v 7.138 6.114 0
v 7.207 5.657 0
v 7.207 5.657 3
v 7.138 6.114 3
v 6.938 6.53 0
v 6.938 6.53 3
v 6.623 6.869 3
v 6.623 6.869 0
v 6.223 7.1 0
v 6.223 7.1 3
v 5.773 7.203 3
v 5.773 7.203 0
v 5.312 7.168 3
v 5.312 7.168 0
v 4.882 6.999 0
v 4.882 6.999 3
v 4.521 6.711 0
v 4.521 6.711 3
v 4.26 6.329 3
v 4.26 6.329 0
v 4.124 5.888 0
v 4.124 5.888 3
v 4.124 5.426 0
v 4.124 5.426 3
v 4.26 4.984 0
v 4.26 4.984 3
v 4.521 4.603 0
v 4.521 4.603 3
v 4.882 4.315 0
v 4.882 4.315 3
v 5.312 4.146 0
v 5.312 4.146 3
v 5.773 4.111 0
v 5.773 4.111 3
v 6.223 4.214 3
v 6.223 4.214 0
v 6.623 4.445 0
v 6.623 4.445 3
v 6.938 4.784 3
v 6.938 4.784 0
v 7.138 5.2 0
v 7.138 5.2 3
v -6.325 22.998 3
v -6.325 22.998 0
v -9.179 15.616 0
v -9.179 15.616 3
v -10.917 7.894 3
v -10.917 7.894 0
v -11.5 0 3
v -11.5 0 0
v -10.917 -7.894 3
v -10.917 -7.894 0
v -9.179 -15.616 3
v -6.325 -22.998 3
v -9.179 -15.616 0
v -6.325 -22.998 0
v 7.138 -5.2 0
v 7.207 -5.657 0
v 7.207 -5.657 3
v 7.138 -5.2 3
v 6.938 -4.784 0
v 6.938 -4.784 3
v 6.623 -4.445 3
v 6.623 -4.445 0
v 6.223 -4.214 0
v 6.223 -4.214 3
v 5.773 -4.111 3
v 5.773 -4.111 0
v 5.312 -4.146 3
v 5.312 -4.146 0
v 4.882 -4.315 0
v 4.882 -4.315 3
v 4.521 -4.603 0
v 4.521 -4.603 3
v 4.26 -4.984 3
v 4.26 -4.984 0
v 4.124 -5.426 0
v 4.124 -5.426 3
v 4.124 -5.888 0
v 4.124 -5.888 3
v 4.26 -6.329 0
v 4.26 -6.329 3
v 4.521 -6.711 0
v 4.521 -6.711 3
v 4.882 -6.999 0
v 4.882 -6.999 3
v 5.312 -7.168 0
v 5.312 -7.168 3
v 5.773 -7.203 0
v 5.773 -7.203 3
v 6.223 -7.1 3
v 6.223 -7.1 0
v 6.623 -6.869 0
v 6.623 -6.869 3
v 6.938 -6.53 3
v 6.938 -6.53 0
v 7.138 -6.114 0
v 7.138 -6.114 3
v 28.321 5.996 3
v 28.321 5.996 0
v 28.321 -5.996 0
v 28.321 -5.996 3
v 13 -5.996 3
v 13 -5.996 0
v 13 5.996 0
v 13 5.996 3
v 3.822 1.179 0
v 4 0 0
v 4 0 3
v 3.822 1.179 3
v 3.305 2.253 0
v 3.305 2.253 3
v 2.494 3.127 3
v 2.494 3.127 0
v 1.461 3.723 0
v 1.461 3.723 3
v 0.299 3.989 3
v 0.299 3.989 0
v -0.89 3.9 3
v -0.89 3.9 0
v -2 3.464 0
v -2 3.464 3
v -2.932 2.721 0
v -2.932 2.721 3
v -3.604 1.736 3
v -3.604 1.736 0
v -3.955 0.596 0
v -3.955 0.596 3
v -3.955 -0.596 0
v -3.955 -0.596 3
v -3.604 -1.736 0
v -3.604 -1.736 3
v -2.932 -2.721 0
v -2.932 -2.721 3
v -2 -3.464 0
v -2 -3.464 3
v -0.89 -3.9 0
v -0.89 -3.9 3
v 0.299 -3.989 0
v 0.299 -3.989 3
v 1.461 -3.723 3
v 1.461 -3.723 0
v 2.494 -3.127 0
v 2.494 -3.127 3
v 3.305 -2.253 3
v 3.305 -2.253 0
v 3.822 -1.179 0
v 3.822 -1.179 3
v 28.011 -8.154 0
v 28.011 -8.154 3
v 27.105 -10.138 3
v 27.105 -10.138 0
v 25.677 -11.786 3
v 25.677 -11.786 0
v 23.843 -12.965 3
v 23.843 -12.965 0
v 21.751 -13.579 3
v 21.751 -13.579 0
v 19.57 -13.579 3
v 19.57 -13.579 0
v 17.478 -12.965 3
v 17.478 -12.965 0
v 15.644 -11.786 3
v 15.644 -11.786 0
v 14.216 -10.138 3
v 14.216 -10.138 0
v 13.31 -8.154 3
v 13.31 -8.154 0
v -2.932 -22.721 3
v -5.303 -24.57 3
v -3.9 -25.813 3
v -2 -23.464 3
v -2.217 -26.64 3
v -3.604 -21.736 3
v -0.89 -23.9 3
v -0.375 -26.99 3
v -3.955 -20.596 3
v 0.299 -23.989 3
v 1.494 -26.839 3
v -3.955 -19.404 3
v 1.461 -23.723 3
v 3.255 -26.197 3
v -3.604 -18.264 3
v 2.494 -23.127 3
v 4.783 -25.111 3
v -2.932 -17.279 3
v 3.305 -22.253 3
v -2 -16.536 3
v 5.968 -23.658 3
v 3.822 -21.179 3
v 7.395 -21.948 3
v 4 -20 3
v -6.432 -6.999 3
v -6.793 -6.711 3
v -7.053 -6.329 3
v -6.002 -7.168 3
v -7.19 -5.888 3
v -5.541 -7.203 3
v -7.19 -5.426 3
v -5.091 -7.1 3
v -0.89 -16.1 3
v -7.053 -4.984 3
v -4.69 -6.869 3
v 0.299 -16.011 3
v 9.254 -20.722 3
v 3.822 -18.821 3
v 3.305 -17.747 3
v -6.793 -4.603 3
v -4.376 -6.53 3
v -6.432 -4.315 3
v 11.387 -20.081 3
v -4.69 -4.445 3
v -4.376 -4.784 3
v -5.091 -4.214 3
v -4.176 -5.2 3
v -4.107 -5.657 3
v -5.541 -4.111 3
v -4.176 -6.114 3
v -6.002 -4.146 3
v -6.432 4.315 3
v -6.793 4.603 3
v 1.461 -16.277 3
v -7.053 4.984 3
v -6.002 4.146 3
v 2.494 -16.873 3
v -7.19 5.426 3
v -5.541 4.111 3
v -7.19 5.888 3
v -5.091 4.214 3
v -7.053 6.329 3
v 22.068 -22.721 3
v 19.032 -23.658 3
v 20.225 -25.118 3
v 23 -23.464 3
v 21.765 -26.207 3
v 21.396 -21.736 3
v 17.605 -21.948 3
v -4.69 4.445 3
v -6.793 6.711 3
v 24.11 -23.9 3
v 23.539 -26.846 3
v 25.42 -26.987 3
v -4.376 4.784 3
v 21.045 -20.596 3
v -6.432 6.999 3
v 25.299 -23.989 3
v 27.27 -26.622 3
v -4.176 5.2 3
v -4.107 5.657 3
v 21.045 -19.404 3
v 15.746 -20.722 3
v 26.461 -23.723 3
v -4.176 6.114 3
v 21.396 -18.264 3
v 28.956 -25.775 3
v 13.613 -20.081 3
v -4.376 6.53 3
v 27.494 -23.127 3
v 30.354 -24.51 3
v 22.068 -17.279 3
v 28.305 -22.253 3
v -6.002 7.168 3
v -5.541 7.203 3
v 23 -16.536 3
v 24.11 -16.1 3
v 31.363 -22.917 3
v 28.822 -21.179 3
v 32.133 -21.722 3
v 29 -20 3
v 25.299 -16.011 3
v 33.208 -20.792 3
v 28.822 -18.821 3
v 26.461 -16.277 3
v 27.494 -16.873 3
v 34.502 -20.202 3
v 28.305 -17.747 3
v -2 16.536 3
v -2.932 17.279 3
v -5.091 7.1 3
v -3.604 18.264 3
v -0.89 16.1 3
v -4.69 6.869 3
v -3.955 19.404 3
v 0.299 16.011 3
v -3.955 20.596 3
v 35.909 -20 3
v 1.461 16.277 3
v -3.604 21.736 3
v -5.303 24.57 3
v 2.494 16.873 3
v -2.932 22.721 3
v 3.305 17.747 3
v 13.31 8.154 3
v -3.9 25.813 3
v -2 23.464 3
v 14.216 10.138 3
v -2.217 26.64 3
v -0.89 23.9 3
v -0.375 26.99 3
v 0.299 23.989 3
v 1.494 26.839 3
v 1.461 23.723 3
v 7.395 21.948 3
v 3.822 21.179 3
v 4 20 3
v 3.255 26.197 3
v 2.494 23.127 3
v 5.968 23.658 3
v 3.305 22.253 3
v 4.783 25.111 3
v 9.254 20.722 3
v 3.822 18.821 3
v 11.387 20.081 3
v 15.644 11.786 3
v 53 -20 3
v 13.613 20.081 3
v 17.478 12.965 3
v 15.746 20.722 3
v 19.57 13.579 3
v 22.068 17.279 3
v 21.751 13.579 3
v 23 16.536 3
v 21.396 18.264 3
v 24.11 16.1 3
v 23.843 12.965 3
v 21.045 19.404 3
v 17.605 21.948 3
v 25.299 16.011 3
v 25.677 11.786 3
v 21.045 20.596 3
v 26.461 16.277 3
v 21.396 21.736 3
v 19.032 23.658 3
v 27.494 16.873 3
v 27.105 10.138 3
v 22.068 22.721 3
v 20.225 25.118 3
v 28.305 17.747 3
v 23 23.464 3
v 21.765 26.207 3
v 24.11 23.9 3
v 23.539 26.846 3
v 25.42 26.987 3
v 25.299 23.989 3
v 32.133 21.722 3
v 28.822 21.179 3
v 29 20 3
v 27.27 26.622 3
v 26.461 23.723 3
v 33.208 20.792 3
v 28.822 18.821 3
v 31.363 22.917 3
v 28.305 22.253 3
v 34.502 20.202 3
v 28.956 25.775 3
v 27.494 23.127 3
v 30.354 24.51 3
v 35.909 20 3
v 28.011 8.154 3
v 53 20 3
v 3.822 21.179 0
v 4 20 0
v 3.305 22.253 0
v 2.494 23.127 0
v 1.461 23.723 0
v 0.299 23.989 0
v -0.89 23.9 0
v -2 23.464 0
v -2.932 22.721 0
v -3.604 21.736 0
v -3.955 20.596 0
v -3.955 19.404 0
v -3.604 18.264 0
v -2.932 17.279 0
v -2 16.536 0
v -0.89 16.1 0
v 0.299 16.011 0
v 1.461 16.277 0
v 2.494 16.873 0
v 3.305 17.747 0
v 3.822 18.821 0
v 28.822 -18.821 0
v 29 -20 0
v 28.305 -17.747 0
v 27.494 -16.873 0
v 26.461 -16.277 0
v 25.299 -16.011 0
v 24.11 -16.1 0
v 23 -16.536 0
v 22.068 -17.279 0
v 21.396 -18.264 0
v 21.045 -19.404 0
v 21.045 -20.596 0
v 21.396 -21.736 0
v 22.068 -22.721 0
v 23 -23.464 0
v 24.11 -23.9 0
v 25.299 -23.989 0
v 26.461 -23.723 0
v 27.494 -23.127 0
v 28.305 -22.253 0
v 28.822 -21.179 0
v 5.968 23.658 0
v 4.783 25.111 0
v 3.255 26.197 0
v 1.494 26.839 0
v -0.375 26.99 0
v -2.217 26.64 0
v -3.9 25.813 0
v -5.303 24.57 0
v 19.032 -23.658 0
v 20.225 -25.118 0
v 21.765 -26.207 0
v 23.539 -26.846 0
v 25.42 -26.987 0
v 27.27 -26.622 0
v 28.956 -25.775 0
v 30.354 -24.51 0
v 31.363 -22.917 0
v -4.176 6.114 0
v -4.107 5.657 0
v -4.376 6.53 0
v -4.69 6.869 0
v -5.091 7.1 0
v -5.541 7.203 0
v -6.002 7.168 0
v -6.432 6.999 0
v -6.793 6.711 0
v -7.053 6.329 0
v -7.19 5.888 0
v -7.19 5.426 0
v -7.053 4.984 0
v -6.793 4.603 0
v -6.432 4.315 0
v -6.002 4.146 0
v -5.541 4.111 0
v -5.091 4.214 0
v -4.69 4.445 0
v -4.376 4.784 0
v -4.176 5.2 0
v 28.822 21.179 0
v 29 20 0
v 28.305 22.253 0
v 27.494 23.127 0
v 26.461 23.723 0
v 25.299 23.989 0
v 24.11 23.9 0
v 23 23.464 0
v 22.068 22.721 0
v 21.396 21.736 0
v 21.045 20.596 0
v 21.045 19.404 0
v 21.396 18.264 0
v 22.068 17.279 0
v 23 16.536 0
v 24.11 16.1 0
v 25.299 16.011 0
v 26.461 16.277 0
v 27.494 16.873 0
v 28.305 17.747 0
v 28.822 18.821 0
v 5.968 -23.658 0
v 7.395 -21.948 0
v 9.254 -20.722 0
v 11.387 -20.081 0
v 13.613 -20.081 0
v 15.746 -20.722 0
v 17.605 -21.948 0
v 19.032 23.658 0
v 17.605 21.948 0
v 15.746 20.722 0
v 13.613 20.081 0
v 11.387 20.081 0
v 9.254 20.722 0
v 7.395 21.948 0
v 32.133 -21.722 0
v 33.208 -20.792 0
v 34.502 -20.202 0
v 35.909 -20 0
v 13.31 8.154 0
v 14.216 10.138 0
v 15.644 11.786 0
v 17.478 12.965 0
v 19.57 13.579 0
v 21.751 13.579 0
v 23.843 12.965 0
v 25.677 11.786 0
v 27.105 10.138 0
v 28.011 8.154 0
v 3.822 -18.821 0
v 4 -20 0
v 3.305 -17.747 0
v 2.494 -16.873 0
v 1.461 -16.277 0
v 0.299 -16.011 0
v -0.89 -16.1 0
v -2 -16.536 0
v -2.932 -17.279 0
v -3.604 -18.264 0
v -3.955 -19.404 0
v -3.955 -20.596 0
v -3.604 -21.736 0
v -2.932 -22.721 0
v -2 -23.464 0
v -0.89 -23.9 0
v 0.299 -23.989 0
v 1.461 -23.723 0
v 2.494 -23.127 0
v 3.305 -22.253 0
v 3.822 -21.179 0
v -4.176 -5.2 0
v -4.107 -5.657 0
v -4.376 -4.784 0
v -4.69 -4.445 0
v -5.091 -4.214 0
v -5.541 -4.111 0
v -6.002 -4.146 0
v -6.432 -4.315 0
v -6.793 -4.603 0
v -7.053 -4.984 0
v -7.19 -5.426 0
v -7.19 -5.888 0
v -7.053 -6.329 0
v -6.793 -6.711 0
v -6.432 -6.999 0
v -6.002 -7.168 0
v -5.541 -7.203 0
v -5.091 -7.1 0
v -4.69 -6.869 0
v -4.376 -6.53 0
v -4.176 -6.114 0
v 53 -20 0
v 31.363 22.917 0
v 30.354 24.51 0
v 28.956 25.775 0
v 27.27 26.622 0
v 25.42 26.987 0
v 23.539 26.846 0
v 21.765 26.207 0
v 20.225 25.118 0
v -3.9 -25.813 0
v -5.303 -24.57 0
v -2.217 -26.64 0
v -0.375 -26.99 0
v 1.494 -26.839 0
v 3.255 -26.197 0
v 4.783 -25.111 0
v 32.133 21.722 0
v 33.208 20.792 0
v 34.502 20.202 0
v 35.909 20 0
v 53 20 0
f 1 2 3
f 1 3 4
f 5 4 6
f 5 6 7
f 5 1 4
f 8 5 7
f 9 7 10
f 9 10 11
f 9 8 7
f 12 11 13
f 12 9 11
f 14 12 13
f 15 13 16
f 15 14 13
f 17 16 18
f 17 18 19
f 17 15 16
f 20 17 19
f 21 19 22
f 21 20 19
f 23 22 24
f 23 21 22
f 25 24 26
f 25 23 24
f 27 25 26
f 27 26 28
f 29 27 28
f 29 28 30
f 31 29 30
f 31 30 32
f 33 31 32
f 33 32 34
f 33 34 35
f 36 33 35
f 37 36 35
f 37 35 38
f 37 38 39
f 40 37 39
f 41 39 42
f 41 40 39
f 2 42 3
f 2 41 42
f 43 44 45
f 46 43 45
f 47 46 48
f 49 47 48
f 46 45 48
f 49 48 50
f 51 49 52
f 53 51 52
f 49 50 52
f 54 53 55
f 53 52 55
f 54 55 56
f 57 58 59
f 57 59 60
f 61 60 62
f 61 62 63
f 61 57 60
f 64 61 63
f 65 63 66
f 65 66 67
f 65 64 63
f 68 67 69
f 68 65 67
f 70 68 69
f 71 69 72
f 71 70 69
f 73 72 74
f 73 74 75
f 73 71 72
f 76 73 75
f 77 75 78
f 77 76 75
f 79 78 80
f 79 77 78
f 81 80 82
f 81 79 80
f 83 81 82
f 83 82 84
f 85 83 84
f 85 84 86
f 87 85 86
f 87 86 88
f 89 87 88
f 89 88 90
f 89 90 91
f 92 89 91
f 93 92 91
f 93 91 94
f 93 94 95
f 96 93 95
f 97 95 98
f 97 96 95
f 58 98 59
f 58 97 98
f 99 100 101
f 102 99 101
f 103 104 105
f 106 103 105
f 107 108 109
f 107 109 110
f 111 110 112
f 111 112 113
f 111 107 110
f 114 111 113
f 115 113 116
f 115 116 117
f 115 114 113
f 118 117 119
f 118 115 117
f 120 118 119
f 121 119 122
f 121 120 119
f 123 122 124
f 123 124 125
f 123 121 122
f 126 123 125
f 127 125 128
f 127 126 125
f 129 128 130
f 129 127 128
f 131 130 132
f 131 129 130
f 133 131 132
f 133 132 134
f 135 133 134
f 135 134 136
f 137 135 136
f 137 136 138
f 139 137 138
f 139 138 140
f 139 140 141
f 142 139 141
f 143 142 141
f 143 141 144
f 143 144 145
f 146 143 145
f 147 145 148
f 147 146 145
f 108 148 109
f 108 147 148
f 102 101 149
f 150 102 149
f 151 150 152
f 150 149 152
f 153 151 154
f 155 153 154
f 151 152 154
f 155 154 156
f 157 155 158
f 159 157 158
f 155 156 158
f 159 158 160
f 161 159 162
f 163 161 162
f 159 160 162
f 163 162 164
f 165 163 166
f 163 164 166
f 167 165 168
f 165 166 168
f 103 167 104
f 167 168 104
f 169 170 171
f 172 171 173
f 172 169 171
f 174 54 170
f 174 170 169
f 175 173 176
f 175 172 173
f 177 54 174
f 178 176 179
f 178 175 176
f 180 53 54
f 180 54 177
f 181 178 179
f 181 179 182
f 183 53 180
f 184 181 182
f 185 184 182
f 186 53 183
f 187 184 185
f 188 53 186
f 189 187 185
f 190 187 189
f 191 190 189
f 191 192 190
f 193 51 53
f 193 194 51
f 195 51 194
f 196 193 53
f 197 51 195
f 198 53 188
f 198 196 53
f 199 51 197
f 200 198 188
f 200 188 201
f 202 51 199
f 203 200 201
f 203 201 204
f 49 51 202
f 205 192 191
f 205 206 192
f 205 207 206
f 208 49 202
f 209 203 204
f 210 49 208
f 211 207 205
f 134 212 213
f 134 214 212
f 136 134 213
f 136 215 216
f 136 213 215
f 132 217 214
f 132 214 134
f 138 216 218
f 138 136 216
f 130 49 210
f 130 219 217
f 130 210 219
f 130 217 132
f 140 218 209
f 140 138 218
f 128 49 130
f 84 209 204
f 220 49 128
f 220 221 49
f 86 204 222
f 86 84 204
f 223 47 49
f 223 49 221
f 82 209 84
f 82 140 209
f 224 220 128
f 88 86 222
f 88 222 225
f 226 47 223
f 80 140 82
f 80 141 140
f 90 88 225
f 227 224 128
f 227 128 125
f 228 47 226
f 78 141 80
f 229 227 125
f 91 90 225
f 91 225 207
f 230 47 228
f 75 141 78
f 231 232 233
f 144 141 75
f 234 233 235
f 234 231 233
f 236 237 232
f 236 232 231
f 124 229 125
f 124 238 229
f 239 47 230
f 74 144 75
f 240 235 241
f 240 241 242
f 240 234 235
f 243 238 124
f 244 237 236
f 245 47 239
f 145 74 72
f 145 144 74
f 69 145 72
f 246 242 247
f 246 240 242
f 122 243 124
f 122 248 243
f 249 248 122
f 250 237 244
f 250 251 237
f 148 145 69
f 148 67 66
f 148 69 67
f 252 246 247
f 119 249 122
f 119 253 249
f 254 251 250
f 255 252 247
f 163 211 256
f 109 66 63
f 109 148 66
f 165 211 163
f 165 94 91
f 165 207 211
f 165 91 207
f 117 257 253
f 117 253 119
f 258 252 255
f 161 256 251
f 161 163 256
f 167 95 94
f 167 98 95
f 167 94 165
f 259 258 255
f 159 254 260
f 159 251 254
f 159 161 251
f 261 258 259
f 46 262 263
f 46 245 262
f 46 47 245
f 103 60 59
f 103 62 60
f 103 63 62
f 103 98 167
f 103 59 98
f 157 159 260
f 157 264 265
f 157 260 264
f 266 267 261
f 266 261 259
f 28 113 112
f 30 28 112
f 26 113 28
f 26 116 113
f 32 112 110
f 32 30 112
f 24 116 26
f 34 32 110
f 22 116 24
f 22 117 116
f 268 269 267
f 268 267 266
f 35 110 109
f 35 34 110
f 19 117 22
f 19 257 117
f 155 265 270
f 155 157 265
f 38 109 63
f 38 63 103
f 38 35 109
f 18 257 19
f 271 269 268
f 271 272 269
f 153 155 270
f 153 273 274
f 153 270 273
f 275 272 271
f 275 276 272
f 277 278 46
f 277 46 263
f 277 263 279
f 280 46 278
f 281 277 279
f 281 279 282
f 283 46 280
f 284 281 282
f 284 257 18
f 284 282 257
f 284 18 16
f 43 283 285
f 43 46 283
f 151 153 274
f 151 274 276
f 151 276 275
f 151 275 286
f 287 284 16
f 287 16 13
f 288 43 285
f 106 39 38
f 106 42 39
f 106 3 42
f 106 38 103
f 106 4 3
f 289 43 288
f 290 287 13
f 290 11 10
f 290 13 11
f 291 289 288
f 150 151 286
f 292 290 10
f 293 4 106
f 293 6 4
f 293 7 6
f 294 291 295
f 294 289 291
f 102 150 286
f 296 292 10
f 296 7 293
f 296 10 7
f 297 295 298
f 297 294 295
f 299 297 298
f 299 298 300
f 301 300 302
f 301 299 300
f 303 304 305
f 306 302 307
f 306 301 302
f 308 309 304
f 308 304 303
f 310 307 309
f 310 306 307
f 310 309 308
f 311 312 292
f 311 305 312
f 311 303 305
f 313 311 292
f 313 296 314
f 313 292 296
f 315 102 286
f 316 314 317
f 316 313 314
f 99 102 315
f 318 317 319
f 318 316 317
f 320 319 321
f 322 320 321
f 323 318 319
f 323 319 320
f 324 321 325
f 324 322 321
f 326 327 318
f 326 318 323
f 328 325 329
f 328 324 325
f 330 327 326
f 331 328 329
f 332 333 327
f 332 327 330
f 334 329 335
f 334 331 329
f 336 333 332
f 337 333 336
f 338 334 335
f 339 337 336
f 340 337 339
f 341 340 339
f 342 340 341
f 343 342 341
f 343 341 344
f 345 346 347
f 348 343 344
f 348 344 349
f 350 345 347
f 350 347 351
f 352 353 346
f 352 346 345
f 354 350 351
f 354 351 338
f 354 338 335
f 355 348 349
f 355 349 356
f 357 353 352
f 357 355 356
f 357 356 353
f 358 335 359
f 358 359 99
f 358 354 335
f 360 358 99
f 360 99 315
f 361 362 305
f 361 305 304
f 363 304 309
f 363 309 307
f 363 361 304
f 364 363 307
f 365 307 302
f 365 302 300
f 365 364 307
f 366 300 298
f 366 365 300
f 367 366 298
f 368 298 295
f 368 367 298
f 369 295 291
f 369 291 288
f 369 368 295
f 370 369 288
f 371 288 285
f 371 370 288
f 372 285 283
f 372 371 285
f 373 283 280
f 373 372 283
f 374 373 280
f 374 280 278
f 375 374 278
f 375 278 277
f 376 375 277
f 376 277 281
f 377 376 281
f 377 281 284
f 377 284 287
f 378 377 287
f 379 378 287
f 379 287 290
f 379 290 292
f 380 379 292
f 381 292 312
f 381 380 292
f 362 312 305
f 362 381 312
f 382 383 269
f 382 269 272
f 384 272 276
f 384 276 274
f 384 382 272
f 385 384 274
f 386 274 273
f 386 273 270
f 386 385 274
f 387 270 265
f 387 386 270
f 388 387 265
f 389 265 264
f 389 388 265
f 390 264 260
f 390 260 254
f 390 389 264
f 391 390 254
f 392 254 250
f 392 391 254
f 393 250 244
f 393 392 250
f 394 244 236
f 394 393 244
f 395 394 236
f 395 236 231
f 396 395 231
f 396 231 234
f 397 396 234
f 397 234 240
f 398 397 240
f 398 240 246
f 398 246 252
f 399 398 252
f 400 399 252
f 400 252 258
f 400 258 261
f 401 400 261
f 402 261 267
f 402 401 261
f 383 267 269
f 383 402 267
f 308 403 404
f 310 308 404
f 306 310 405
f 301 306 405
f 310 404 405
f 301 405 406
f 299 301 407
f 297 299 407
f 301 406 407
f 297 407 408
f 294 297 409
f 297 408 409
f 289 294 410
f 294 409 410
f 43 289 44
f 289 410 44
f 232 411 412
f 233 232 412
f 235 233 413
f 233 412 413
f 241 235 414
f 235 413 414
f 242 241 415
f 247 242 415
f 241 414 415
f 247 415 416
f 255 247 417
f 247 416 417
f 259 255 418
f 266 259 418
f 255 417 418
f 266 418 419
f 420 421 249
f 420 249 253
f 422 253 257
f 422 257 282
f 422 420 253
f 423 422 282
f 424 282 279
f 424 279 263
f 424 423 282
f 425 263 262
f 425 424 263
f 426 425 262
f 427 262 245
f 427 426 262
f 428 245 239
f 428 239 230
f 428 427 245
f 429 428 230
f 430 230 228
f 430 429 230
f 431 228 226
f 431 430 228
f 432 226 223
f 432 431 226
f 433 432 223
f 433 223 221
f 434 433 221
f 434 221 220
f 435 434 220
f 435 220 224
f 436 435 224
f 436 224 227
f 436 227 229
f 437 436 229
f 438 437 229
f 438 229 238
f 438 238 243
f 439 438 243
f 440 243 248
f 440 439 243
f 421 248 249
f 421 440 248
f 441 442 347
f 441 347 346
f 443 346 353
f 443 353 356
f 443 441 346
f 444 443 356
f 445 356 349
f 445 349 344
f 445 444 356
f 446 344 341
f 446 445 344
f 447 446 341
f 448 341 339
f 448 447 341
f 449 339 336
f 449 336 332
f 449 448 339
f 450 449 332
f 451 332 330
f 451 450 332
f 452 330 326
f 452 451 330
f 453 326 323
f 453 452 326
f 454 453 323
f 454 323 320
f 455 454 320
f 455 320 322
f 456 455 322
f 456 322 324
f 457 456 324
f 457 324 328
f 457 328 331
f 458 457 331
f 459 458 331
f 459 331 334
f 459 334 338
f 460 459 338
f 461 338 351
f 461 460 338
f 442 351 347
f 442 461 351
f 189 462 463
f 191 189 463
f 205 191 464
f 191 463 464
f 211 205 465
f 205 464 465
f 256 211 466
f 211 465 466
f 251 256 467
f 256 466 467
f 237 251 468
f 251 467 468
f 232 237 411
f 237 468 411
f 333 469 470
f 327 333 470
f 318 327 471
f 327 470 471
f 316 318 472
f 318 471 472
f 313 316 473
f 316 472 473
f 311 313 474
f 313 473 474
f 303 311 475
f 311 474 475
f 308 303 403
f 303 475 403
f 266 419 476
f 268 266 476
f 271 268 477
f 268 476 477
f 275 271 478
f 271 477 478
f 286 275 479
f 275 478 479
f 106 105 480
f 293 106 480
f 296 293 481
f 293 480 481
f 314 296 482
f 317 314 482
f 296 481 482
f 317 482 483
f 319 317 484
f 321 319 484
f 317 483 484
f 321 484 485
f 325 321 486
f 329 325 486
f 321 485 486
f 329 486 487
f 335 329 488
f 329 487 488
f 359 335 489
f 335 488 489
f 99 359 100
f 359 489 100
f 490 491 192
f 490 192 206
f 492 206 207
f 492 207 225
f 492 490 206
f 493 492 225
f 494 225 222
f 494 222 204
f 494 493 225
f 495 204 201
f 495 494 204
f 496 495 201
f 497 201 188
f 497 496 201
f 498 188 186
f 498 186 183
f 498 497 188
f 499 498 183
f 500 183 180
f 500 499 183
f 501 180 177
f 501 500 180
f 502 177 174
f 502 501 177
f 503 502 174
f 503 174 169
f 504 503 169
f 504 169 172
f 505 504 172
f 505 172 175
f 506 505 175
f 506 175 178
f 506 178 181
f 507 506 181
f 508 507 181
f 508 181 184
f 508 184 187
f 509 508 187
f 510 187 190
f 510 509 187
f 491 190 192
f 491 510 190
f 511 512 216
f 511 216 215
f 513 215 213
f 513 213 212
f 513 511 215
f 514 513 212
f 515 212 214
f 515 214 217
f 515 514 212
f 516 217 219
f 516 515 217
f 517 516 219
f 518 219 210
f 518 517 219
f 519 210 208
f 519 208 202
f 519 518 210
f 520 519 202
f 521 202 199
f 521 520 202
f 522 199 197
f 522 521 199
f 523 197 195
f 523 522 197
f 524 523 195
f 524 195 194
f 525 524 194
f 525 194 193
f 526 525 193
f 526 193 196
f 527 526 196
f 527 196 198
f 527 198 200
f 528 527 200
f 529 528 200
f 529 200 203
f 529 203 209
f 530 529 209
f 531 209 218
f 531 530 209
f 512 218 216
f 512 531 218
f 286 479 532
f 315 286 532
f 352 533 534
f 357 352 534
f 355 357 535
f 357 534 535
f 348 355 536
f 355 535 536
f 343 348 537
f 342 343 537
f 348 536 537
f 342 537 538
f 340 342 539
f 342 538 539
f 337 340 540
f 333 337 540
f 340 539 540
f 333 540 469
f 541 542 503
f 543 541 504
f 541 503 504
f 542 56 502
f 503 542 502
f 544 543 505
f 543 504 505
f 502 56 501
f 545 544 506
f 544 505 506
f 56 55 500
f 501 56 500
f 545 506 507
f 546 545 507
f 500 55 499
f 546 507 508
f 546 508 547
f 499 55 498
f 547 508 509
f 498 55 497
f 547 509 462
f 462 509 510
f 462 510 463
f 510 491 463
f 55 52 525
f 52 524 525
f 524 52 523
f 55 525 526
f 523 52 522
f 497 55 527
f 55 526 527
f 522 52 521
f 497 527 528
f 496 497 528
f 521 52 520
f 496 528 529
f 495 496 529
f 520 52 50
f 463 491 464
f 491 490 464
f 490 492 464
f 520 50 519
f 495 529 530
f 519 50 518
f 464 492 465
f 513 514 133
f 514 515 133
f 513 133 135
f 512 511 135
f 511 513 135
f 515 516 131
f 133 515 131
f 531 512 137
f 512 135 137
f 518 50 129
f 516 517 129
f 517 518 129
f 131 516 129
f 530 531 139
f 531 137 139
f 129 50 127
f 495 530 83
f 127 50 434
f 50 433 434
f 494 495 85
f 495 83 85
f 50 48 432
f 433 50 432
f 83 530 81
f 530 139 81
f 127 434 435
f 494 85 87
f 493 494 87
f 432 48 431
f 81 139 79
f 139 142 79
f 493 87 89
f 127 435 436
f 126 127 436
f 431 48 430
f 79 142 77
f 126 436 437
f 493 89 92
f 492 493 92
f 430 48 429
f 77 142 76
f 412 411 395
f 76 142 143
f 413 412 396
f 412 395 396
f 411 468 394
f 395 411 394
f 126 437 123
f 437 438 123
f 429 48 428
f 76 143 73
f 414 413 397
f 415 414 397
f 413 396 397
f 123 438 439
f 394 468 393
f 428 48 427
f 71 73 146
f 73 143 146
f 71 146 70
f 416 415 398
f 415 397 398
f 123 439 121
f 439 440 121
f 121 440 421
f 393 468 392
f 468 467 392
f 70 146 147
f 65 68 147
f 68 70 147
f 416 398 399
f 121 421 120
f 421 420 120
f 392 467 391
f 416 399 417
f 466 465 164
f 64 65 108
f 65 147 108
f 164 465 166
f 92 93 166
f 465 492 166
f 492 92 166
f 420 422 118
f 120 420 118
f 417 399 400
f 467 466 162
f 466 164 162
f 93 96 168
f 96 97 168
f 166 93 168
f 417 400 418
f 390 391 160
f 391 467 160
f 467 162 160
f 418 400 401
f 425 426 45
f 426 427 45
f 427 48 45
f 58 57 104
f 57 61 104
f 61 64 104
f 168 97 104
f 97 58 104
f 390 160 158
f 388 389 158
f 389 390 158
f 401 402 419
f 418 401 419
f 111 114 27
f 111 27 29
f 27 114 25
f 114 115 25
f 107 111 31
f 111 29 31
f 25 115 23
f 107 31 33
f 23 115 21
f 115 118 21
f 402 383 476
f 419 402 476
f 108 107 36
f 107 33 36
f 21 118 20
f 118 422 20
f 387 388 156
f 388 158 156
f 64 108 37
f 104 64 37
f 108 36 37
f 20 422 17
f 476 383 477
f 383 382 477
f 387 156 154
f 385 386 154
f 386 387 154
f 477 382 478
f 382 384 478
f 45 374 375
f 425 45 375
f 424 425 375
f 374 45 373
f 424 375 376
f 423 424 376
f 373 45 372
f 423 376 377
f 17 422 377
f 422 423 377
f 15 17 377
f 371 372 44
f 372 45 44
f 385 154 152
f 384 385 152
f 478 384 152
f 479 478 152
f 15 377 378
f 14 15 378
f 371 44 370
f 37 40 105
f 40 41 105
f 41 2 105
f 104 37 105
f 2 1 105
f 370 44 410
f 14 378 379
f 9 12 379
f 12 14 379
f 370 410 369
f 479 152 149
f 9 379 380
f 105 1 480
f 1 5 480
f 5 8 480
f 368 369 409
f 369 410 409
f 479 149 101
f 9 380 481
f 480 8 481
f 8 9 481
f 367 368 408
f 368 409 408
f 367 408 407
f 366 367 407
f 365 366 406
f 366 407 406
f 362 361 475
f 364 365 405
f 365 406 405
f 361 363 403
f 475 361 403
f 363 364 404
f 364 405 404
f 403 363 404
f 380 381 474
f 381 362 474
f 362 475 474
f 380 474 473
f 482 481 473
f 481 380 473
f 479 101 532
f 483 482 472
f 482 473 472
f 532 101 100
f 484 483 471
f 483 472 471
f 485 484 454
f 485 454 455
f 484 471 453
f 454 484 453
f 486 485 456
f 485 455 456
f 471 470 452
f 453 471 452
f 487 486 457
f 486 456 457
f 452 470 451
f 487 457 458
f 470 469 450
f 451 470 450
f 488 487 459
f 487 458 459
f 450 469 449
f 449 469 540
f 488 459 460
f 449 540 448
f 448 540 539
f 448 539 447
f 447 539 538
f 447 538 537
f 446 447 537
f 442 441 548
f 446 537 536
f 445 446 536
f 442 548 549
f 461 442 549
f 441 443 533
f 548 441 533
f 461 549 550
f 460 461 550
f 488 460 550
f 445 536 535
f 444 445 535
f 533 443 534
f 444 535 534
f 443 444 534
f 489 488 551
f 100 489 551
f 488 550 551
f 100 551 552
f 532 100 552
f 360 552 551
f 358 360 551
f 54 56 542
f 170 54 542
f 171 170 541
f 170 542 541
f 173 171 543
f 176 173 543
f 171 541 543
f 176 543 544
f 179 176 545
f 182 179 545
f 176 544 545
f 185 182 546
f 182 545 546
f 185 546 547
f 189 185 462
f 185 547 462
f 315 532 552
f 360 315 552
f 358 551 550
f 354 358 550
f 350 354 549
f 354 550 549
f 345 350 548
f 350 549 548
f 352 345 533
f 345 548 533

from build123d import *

# Parameters (mm, degrees)
F0_R     = 4
F0_R_2   = 1.55
F1_DEPTH = 3


with BuildPart() as f1:
    # F0 (on Top) → F1 (new body)
    with BuildSketch(Plane.XY):
        with BuildLine():
            ThreePointArc((19.031669, 23.657734), (12.5, 20), (5.968331, 23.657734))
            ThreePointArc((5.968331, 23.657734), (-0.374988, 26.989949), (-6.325402, 22.998215))
            ThreePointArc((-6.325402, 22.998215), (-11.5, 0), (-6.325402, -22.998215))
            ThreePointArc((-6.325402, -22.998215), (-0.374988, -26.989949), (5.968331, -23.657734))
            ThreePointArc((5.968331, -23.657734), (12.5, -20), (19.031669, -23.657734))
            ThreePointArc((19.031669, -23.657734), (25.419903, -26.987394), (31.363415, -22.916667))
            ThreePointArc((31.363415, -22.916667), (33.208403, -20.791873), (35.908712, -20))
            Line((35.908712, -20), (53, -20))
            Line((53, -20), (53, 20))
            Line((53, 20), (35.908712, 20))
            ThreePointArc((35.908712, 20), (33.208403, 20.791873), (31.363415, 22.916667))
            ThreePointArc((31.363415, 22.916667), (25.419903, 26.987394), (19.031669, 23.657734))
        make_face()
        with Locations((0, -20)):
            Circle(F0_R, mode=Mode.SUBTRACT)
        with Locations((-5.656854, -5.656854)):
            Circle(F0_R_2, mode=Mode.SUBTRACT)
        with Locations((5.656854, -5.656854)):
            Circle(F0_R_2, mode=Mode.SUBTRACT)
        with Locations((25, -20)):
            Circle(F0_R, mode=Mode.SUBTRACT)
        with Locations((-5.656854, 5.656854)):
            Circle(F0_R_2, mode=Mode.SUBTRACT)
        Circle(F0_R, mode=Mode.SUBTRACT)
        with Locations((5.656854, 5.656854)):
            Circle(F0_R_2, mode=Mode.SUBTRACT)
        with BuildLine():
            ThreePointArc((13, 5.996174), (20.660714, 13.656888), (28.321429, 5.996174))
            Line((28.321429, 5.996174), (28.321429, -5.996174))
            ThreePointArc((28.321429, -5.996174), (20.660714, -13.656888), (13, -5.996174))
            Line((13, -5.996174), (13, 5.996174))
        make_face(mode=Mode.SUBTRACT)
        with Locations((0, 20)):
            Circle(F0_R, mode=Mode.SUBTRACT)
        with Locations((25, 20)):
            Circle(F0_R, mode=Mode.SUBTRACT)
    extrude(amount=F1_DEPTH)


solid = f1.part
